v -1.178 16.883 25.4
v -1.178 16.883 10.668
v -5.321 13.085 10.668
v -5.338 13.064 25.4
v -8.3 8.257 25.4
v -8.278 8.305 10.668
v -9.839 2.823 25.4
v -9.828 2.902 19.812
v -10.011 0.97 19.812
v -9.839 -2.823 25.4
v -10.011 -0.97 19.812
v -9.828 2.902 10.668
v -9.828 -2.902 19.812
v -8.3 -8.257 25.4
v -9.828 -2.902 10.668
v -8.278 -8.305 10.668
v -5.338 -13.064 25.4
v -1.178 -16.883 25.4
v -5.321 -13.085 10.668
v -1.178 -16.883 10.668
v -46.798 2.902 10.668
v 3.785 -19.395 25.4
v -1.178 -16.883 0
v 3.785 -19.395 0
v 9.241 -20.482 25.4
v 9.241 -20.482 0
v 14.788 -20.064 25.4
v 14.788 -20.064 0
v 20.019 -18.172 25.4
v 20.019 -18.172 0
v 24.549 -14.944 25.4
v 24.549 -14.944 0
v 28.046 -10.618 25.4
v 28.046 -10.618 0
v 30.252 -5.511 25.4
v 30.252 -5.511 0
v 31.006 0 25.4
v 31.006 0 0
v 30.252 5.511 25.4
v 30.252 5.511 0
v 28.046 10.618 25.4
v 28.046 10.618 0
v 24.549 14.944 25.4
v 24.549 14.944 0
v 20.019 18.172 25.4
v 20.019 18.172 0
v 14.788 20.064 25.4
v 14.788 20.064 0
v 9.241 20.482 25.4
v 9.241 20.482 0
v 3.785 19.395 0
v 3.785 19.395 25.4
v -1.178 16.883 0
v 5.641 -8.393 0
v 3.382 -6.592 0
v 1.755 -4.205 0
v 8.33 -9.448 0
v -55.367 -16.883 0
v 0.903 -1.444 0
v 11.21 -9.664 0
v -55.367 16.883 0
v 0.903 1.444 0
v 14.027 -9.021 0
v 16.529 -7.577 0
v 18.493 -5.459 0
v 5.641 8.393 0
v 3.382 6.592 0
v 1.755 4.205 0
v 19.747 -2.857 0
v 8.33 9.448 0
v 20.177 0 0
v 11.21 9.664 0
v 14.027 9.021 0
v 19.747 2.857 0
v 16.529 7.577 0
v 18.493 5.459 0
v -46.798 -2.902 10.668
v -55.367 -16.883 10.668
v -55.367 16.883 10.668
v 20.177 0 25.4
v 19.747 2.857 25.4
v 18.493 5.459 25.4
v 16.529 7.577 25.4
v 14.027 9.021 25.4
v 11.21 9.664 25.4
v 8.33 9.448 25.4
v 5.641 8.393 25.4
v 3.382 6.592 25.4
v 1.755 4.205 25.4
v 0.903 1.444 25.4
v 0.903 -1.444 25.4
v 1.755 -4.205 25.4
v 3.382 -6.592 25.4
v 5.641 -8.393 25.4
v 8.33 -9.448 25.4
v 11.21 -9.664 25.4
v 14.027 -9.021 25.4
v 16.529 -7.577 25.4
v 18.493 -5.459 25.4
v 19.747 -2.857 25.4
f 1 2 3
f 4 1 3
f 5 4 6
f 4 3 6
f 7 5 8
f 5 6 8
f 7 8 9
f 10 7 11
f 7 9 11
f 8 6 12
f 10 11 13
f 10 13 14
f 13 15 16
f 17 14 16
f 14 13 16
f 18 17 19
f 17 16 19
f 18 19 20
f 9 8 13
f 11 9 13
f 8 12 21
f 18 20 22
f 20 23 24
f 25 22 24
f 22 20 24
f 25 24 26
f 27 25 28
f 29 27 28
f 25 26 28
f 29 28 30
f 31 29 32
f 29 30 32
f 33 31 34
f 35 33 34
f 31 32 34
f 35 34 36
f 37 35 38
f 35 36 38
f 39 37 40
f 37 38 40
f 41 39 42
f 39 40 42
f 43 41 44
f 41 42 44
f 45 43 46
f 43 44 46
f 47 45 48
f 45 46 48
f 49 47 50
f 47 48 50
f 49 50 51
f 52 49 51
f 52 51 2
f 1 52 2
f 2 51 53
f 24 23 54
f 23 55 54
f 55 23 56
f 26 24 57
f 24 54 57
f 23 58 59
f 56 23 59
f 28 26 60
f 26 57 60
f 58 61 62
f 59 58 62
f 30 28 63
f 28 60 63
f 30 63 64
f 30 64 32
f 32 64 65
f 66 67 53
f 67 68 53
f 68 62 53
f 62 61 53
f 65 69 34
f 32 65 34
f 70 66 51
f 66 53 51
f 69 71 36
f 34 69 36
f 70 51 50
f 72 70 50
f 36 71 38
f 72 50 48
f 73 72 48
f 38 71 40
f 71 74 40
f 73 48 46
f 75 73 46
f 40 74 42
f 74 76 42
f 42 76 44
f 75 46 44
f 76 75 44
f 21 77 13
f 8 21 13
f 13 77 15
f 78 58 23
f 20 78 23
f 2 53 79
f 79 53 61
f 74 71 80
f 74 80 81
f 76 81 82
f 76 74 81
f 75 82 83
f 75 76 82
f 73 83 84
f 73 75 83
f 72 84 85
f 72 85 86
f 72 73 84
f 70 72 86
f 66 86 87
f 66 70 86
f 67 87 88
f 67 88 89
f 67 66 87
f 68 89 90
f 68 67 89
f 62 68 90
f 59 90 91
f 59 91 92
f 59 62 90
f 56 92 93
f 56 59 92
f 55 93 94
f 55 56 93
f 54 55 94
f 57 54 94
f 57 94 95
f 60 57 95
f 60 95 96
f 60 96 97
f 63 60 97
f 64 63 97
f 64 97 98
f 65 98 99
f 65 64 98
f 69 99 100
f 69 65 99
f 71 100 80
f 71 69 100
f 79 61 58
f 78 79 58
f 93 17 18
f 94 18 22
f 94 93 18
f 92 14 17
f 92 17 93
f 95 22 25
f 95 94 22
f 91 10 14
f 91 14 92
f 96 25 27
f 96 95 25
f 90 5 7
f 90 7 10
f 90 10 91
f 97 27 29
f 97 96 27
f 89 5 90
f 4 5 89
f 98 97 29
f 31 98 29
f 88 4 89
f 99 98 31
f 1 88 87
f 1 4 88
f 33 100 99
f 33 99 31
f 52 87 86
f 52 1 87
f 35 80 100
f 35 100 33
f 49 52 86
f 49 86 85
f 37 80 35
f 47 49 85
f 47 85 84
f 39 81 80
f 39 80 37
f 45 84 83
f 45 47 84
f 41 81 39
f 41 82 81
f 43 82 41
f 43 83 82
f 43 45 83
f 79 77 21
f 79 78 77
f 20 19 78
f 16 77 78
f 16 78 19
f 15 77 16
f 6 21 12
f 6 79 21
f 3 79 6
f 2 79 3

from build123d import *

# Parameters (mm, degrees)
F1_DEPTH = 10.668
F0_R     = 9.6911240881
F2_DEPTH = 25.4
F4_DEPTH = 9.144
F6_DEPTH = 23.4226514116


with BuildPart() as f1:
    # F0 (on Top) → F1 (new body)
    with BuildSketch(Plane.XY):
        with BuildLine():
            ThreePointArc((-1.1775513103, -16.8828442693), (-10.0338594761, 0), (-1.1775513103, 16.8828442693))
            Line((-1.1775513103, 16.8828442693), (-55.3673403338, 16.8828442693))
            Line((-55.3673403338, 16.8828442693), (-55.3673403338, -16.8828442693))
            Line((-55.3673403338, -16.8828442693), (-1.1775513103, -16.8828442693))
        make_face()
    extrude(amount=F1_DEPTH)

    # F0 (on Top) → F2 (join)
    with BuildSketch(Plane.XY):
        with BuildLine():
            ThreePointArc((31.0063367483, 0), (20.0186127494, 18.1716336717), (-1.1775513103, 16.8828442693))
            ThreePointArc((-1.1775513103, 16.8828442693), (-10.0338594761, 0), (-1.1775513103, -16.8828442693))
            ThreePointArc((-1.1775513103, -16.8828442693), (20.0186127494, -18.1716336717), (31.0063367483, 0))
        make_face()
        with Locations((10.4862386361, 0)):
            Circle(F0_R, mode=Mode.SUBTRACT)
    extrude(amount=F2_DEPTH)

    # F3 (on face) → F4 (join)
    with BuildSketch(Plane.XY.offset(10.668)):
        with BuildLine():
            ThreePointArc((-9.8276830676, -2.9015532994), (-10.0338594761, 0), (-9.8276830676, 2.9015532994))
            Line((-9.8276830676, 2.9015532994), (-46.7980072435, 2.9015532994))
            Line((-46.7980072435, 2.9015532994), (-46.7980072435, -2.9015532994))
            Line((-46.7980072435, -2.9015532994), (-9.8276830676, -2.9015532994))
        make_face()
    extrude(amount=F4_DEPTH)

    # F5 (on face) → F6 (cut, through all)
    with BuildSketch(Plane.XZ.offset(2.9015532994)):
        Polygon((-46.7980072435, 10.668), (-9.8276830676, 19.812), (-46.7980072435, 19.812), align=None)
    extrude(amount=-F6_DEPTH, mode=Mode.SUBTRACT)


solid = f1.part
